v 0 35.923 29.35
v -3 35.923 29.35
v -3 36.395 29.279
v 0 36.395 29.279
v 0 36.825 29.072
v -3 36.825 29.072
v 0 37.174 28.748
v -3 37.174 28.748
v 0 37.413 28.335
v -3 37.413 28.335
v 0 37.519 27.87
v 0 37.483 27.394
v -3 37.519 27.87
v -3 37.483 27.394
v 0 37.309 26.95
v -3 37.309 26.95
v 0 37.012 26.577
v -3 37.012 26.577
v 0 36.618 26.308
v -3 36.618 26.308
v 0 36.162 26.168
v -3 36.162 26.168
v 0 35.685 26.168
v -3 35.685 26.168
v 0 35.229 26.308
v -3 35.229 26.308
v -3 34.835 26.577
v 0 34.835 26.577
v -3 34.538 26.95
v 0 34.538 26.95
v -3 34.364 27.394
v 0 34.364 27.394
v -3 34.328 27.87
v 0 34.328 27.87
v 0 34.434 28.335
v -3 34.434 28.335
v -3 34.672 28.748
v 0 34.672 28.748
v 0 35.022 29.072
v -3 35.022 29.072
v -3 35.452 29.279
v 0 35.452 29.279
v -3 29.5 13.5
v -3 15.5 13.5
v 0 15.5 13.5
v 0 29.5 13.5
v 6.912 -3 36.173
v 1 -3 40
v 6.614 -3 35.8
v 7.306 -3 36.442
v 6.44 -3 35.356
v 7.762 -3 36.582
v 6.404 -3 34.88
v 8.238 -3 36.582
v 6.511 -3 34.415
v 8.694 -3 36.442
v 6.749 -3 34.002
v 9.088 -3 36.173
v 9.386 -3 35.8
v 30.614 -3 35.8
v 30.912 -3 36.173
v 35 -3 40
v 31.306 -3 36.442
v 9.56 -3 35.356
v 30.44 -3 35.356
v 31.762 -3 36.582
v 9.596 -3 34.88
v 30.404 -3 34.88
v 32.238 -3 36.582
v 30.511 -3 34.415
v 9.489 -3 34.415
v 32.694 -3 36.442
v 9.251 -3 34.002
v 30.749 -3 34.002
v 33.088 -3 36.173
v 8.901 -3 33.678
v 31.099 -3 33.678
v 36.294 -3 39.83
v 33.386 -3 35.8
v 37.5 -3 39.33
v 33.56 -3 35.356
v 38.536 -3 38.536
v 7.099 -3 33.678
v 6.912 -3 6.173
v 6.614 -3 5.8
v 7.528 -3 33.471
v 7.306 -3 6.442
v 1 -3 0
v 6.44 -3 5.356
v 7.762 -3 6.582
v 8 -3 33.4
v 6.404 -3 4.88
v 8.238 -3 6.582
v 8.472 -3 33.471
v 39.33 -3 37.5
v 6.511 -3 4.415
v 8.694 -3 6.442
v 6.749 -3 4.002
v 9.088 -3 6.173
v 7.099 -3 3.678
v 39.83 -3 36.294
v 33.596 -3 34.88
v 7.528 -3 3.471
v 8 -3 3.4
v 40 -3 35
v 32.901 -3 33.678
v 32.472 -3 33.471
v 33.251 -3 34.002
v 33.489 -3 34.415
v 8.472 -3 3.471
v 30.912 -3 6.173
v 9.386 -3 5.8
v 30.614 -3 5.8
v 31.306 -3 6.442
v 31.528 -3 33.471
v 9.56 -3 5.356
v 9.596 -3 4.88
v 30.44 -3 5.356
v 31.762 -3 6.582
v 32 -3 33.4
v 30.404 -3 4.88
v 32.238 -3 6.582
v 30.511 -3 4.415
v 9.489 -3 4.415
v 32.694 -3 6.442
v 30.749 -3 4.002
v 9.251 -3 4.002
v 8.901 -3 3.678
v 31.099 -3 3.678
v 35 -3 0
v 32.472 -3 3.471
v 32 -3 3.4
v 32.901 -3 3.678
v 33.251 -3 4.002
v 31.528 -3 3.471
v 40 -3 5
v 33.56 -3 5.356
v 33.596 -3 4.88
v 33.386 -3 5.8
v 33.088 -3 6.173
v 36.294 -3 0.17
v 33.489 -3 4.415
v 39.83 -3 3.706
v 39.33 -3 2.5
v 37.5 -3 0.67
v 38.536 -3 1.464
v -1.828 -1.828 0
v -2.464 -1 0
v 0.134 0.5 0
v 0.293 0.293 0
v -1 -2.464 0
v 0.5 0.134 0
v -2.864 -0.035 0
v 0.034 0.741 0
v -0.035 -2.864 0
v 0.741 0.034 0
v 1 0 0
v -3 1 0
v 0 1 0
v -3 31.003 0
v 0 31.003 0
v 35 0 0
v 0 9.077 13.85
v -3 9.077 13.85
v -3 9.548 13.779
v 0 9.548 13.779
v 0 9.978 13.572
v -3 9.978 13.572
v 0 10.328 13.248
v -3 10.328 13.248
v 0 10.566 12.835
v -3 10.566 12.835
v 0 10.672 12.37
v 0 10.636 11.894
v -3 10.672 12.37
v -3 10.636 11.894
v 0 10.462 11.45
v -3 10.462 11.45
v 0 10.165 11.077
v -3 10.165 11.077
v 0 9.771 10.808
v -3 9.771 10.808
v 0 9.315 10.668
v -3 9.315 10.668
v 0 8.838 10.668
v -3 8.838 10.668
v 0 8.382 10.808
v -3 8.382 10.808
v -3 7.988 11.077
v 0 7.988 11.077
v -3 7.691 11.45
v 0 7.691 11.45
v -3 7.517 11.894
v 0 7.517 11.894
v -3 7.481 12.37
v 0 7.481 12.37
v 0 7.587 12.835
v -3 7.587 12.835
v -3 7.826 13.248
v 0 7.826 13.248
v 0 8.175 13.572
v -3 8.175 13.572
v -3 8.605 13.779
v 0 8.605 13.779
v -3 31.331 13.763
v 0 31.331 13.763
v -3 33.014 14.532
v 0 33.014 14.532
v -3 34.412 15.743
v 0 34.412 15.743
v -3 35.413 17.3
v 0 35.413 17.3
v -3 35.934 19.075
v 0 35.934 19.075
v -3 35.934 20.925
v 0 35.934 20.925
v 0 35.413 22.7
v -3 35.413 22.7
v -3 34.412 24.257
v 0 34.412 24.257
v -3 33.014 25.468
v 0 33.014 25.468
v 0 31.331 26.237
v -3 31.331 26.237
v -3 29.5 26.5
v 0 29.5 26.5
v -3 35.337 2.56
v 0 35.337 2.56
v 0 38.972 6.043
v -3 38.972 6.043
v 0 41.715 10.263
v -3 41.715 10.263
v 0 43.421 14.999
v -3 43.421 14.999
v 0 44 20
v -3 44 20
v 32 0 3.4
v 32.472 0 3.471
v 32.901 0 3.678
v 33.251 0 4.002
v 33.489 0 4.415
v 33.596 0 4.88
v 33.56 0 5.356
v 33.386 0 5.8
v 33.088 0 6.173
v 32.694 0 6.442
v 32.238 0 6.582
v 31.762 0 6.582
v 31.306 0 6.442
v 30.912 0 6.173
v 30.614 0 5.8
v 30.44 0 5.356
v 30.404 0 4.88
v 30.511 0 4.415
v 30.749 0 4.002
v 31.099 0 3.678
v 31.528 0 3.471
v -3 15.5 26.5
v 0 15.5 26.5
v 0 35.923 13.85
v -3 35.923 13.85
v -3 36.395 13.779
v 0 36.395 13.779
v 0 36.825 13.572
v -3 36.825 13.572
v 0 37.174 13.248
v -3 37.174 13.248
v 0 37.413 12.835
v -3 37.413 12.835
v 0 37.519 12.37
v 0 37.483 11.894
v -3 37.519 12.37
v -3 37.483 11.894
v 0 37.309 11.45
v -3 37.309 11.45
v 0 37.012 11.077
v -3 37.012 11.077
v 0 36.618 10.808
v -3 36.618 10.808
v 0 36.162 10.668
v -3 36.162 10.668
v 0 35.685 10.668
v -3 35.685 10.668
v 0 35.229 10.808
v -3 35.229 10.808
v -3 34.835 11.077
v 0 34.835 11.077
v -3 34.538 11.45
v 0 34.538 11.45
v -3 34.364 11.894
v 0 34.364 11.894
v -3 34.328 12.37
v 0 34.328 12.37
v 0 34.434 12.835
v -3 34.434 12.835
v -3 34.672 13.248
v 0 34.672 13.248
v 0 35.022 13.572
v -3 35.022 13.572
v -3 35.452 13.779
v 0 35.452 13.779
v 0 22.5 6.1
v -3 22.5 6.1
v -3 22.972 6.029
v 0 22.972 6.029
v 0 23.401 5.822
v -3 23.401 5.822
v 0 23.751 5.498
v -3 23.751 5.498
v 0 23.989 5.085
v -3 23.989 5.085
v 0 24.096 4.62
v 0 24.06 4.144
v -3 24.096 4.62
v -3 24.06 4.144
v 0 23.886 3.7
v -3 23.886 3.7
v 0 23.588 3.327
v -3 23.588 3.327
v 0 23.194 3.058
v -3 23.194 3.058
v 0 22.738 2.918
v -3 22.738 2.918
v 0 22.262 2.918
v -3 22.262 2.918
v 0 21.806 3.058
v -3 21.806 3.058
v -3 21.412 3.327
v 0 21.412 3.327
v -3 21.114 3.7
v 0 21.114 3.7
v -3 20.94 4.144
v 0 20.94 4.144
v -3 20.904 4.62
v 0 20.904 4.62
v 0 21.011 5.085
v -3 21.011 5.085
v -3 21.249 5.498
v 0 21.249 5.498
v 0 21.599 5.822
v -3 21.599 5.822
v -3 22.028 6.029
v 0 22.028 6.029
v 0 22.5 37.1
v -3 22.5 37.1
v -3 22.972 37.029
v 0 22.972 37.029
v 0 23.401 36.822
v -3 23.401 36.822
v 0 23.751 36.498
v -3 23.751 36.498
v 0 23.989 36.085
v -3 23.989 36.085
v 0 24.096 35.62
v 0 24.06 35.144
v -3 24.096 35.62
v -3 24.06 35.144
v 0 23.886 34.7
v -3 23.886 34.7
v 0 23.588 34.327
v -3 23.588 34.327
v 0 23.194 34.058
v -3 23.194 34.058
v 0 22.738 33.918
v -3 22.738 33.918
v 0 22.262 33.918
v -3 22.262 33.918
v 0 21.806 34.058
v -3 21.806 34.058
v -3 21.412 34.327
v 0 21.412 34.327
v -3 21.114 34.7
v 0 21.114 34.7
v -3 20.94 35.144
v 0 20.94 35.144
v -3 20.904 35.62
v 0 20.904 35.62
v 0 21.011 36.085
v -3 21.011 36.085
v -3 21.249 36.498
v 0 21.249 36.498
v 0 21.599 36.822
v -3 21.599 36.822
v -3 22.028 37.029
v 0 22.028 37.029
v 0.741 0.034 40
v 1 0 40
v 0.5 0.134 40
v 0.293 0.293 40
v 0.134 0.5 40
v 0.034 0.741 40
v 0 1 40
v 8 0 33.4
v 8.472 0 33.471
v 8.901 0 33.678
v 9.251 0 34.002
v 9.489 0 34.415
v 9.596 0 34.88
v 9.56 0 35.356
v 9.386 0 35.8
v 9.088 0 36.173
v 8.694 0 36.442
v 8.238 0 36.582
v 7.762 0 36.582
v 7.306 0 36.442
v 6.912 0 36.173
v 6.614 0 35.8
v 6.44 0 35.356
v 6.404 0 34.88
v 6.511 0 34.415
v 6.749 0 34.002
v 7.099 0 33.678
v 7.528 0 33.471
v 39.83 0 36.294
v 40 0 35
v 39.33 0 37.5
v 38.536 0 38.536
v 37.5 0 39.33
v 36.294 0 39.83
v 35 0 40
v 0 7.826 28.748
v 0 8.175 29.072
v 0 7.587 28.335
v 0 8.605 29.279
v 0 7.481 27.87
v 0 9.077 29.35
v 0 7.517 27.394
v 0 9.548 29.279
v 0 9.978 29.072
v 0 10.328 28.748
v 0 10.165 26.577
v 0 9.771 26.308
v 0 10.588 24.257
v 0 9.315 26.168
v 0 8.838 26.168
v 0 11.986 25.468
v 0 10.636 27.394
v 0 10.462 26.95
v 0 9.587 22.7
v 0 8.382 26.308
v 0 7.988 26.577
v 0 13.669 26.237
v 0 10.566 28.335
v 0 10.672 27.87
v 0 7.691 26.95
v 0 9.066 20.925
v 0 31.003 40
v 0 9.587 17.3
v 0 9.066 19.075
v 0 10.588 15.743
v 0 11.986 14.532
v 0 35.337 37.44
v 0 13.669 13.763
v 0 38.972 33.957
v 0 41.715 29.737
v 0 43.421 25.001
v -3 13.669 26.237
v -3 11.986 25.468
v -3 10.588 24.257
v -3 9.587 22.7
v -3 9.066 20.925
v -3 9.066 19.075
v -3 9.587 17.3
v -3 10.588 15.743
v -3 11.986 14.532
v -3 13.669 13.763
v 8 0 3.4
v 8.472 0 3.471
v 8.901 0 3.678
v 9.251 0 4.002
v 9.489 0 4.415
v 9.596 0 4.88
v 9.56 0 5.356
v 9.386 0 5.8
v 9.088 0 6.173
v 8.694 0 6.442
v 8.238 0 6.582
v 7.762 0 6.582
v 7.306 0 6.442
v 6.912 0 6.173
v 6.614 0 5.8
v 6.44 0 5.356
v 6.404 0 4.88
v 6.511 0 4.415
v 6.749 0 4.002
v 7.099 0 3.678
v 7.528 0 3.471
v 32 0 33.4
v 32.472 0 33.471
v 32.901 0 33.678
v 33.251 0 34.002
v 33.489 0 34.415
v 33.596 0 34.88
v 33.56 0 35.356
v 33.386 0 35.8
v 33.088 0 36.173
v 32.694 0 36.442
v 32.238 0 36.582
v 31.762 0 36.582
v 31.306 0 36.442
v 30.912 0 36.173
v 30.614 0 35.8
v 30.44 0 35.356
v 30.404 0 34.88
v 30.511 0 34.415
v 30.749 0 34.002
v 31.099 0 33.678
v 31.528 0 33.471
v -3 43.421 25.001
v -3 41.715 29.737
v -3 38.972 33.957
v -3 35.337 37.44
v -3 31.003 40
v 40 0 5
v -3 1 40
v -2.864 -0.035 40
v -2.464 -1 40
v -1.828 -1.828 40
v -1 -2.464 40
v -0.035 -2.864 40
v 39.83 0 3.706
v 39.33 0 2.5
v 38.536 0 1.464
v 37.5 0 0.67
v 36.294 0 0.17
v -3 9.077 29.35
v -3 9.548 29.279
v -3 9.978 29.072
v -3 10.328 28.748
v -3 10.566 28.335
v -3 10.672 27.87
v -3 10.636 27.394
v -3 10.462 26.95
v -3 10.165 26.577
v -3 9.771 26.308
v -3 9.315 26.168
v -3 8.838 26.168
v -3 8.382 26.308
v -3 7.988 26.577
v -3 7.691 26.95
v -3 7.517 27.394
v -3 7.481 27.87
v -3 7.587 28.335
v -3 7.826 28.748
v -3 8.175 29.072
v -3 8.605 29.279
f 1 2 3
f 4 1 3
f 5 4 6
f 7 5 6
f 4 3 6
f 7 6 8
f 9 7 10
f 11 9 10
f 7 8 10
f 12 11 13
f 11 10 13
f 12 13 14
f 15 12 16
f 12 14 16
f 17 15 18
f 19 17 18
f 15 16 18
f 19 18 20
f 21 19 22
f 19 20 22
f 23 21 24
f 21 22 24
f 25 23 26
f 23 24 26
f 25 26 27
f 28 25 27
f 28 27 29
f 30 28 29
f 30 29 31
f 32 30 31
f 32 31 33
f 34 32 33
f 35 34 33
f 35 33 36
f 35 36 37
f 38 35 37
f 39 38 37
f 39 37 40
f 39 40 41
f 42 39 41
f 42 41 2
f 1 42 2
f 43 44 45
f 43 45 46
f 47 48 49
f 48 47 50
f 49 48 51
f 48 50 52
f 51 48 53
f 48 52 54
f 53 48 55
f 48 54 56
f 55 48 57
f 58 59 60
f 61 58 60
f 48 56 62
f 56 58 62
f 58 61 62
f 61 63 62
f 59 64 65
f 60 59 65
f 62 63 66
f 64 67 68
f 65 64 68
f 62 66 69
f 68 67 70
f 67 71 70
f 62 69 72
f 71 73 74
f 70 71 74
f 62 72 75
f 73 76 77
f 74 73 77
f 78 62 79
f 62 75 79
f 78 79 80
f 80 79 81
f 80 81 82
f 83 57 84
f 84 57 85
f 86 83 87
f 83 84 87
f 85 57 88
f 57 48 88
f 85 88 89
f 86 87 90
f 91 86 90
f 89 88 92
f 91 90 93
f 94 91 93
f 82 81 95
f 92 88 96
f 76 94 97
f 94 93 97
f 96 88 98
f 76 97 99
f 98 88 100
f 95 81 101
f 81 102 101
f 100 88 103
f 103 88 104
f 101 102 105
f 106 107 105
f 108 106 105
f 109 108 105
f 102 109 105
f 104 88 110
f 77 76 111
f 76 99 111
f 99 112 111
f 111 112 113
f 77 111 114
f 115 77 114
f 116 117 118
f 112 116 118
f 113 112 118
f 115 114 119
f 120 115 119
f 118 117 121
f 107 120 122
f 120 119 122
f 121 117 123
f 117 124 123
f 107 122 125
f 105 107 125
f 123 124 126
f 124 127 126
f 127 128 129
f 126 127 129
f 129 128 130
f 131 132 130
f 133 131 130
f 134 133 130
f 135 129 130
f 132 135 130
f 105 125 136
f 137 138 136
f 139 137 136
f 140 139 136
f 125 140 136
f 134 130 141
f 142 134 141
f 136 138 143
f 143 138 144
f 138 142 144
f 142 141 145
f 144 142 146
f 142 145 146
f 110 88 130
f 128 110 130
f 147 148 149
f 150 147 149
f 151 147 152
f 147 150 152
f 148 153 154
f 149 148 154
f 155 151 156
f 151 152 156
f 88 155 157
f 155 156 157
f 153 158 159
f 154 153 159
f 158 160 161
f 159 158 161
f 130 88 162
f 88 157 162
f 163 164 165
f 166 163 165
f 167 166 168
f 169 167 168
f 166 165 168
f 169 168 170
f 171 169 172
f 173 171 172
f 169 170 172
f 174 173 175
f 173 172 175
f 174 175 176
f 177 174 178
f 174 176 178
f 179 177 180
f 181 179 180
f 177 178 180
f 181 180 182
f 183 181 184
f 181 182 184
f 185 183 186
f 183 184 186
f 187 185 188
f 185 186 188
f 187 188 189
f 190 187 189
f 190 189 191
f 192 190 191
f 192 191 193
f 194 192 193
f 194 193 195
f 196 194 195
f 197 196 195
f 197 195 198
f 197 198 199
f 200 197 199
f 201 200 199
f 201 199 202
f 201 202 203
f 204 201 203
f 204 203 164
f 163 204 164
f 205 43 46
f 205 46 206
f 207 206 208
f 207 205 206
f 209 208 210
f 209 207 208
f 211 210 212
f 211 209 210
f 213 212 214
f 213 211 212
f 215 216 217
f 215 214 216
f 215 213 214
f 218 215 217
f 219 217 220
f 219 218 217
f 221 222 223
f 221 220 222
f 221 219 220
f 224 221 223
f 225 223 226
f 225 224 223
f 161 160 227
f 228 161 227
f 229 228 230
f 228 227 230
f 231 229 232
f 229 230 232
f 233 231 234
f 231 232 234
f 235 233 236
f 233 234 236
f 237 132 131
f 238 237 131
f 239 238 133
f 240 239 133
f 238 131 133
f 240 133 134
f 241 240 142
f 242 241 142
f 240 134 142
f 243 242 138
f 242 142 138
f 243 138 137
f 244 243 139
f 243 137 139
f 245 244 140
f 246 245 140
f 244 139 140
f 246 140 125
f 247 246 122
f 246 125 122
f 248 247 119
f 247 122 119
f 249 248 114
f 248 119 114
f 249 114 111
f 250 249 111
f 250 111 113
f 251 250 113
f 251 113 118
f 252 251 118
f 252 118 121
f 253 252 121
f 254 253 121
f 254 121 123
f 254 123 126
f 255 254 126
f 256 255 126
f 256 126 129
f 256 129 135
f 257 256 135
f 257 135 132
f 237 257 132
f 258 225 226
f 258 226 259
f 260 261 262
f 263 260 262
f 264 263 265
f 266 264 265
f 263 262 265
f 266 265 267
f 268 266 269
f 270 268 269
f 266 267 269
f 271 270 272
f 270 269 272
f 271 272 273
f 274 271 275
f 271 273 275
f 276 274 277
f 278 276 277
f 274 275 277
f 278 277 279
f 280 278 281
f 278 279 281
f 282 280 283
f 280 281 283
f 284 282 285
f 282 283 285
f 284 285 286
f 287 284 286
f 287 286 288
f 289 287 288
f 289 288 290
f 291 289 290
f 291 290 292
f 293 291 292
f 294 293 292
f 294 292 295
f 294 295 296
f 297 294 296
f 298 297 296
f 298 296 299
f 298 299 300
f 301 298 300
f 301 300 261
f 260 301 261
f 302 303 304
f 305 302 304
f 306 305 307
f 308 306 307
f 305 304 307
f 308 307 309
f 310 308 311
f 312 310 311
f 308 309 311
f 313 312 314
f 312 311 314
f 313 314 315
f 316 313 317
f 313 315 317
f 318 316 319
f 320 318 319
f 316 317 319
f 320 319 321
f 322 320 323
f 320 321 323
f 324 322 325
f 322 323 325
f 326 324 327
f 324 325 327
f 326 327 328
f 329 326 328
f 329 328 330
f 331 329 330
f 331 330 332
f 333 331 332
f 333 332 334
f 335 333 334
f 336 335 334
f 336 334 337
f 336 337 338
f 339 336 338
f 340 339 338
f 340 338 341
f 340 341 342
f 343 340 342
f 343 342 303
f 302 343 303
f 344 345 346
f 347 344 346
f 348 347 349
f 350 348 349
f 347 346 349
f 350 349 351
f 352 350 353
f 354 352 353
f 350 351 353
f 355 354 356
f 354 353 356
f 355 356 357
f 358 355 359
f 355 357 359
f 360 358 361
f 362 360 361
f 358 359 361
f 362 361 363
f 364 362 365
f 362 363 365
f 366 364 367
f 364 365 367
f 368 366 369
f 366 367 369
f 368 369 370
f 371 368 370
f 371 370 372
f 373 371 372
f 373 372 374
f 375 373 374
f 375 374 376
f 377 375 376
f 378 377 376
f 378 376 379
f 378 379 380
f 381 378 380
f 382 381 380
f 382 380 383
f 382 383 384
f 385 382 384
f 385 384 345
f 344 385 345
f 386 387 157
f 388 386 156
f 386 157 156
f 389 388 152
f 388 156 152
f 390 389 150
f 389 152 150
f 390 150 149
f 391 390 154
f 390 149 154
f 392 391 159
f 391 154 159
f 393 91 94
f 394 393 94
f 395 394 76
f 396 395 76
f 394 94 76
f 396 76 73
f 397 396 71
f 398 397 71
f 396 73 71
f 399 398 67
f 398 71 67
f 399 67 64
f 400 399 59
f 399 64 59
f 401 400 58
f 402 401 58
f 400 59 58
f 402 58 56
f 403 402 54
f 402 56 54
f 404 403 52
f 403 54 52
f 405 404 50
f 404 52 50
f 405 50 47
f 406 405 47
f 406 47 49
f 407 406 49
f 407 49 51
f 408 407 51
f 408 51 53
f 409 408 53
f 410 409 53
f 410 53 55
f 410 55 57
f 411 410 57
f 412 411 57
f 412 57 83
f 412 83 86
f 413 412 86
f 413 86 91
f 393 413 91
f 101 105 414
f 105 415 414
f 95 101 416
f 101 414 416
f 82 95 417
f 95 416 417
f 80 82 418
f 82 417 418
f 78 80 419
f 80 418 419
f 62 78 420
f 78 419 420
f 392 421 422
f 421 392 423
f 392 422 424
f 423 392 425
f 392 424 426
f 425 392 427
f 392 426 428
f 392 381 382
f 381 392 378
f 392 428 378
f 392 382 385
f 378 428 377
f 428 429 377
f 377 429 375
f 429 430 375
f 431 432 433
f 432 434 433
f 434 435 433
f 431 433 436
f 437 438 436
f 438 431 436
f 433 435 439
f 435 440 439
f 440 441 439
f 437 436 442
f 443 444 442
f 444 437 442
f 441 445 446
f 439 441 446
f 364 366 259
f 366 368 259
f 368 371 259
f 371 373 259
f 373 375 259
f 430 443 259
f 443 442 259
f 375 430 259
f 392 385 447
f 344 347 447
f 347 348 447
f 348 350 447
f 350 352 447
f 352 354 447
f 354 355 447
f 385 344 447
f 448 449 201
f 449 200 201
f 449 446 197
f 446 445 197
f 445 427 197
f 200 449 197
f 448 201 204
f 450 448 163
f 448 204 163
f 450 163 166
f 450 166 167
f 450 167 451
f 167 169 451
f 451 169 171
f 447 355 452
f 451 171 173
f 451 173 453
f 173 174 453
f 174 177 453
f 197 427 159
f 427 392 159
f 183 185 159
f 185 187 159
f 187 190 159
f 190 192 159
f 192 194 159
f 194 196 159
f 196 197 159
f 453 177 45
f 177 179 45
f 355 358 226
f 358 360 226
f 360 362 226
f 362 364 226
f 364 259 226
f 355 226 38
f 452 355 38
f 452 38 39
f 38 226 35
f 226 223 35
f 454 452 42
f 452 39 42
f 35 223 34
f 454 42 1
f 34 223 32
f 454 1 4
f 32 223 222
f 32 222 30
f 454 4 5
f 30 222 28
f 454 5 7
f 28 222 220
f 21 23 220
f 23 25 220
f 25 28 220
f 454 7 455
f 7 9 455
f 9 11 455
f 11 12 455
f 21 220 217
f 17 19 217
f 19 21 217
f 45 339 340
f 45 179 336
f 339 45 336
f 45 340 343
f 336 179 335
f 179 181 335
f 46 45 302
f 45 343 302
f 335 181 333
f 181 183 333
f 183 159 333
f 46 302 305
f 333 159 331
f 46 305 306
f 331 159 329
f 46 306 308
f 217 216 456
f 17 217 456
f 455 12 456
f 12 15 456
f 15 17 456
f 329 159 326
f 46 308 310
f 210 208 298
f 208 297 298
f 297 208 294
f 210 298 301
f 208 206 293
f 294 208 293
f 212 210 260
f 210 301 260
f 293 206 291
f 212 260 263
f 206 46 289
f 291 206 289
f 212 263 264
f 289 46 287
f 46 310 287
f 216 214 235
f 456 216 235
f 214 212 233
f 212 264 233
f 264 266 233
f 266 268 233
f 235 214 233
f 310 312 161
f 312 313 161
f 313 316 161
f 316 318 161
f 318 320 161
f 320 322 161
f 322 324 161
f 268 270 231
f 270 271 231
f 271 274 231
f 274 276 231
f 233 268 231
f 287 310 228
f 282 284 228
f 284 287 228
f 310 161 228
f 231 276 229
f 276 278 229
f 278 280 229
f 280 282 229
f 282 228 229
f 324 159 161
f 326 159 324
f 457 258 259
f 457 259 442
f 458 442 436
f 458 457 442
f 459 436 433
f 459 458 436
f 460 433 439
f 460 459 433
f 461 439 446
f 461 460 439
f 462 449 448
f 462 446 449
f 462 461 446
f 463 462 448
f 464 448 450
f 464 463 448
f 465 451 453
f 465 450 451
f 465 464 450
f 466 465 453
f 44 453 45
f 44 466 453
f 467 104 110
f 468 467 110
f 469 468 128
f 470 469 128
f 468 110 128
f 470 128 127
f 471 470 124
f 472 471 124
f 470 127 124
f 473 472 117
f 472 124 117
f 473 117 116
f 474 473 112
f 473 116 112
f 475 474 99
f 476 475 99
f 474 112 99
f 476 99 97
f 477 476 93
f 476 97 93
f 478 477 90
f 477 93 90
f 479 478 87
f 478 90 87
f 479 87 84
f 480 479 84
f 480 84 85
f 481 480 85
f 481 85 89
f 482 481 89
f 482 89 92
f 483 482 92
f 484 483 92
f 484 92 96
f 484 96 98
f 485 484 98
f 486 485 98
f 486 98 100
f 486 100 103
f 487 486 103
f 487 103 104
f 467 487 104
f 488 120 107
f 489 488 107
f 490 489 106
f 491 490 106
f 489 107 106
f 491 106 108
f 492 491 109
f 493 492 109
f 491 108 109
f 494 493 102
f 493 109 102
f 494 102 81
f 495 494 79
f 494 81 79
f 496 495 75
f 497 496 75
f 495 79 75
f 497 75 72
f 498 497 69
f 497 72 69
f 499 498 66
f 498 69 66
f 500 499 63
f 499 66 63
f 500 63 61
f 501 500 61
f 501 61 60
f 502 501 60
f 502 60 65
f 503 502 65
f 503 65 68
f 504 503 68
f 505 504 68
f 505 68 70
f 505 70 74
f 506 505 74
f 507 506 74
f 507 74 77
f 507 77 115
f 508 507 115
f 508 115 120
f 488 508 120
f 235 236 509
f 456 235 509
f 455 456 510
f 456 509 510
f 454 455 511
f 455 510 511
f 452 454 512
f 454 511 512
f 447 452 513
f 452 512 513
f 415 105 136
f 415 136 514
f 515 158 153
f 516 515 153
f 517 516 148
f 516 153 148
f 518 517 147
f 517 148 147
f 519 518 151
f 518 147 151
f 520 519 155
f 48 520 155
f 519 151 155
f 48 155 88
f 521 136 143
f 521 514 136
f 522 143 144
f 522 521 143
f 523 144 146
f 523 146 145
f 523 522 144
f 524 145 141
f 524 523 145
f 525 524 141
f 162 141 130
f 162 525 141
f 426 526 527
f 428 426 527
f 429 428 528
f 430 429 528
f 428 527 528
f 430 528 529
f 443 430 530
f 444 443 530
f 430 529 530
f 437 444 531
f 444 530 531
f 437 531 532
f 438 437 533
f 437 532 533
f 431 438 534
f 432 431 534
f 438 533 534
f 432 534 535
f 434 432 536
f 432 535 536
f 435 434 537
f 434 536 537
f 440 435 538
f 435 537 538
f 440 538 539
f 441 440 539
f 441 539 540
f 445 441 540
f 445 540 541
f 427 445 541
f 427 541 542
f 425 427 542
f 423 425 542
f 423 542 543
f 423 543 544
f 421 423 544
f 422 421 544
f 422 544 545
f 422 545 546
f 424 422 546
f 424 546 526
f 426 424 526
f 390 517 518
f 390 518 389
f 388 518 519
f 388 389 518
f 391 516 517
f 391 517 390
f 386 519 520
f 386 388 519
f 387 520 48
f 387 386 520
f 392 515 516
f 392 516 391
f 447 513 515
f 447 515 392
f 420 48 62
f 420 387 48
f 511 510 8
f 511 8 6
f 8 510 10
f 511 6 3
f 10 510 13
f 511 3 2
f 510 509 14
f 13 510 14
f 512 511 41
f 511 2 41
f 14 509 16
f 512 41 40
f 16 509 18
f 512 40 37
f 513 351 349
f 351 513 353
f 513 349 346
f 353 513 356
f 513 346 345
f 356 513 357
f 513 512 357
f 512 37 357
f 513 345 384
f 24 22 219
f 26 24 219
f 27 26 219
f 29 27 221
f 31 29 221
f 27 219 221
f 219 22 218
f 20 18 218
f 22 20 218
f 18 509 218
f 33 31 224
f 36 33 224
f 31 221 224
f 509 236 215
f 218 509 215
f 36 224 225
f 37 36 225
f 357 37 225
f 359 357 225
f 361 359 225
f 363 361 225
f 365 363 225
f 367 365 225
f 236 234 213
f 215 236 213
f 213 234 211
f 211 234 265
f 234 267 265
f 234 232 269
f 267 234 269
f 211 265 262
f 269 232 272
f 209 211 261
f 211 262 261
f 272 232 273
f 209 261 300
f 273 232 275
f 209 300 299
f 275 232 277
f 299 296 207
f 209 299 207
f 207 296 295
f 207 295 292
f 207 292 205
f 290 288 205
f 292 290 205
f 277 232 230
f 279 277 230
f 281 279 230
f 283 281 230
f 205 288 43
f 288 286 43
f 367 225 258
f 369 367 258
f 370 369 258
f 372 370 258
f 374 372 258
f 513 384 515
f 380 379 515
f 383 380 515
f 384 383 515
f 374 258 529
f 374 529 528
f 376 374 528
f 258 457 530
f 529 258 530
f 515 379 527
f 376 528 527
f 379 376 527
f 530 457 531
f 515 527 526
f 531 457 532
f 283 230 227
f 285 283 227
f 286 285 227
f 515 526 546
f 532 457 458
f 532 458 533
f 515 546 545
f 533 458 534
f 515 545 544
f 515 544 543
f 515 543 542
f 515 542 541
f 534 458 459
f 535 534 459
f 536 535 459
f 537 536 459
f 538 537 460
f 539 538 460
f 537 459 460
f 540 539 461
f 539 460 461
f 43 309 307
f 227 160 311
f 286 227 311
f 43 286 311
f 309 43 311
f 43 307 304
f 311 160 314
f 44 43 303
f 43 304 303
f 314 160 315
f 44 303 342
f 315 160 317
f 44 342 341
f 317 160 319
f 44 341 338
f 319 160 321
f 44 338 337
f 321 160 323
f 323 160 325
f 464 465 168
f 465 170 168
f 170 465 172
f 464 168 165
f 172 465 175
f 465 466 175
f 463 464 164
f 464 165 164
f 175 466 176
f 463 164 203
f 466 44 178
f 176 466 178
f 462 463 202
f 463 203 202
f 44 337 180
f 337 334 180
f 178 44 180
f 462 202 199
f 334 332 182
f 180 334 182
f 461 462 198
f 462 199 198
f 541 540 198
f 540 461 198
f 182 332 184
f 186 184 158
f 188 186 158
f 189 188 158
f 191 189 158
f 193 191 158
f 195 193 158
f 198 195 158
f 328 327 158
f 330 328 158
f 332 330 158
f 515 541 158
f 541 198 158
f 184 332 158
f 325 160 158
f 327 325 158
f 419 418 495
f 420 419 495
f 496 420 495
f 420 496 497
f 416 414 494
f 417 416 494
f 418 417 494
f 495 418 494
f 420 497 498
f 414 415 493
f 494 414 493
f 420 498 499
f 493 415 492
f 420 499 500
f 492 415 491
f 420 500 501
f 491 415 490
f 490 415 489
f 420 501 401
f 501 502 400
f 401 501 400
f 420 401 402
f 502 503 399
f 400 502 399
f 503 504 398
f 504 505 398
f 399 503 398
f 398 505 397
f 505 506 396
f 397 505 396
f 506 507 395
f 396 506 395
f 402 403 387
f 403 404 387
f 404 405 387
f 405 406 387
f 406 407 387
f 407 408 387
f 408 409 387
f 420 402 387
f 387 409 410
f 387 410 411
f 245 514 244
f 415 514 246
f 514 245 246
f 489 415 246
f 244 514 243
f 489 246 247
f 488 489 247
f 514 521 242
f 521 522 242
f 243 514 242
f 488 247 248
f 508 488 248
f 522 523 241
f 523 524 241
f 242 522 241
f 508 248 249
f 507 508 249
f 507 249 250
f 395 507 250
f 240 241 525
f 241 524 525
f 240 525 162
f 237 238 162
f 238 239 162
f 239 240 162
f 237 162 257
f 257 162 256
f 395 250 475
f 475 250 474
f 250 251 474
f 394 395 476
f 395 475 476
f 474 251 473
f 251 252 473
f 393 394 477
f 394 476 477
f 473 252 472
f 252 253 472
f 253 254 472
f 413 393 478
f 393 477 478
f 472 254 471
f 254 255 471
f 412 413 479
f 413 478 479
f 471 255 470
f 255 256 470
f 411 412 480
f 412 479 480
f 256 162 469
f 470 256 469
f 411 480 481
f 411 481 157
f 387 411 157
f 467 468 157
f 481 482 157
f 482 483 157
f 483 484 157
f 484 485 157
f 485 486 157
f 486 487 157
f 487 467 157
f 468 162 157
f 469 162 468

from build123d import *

# Parameters (mm, degrees)
SM_BASE_FLANGE_1_DEPTH      = 40
CUT_EXTRUDE_3_DEPTH         = 10
CUT_EXTRUDE_1_DEPTH         = 74.382559236
SKETCH_7_R                  = 1.6
CUT_EXTRUDE_2_DEPTH         = 74.382559236
SKETCH_9_R                  = 1.6
CUT_EXTRUDE_4_DEPTH         = 74.545904033
PATTERN_LINEAR_1_COUNT      = 2
PATTERN_LINEAR_1_PITCH      = 30
PATTERN_LINEAR_1_COUNT_DIR2 = 2
PATTERN_LINEAR_1_PITCH_DIR2 = 24
FILLET_1_R                  = 5


# Sheet-metal steps are written as plain solids
with BuildPart() as part:
    # Sketch 1 → 基材-凸緣1 (new body)
    with BuildSketch(Plane.XY):
        with BuildLine():
            Line((40, 0), (1, 0))
            ThreePointArc((1, 0), (0.292893219, 0.292893219), (0, 1))
            Line((0, 1), (0, 44))
            Line((0, 44), (-3, 44))
            Line((-3, 44), (-3, 1))
            ThreePointArc((-3, 1), (-1.828427125, -1.828427125), (1, -3))
            Line((1, -3), (40, -3))
            Line((40, -3), (40, 0))
        make_face()
    extrude(amount=SM_BASE_FLANGE_1_DEPTH)

    # 草圖8 → 除料-伸長3 (cut)
    with BuildSketch(Plane.ZY.offset(3)):
        with BuildLine():
            Line((0, 44), (0, 31.002788981))
            ThreePointArc((0, 31.002788981), (8.073899482, 40.465261916), (20, 44))
            Line((20, 44), (0, 44))
        make_face()
        with BuildLine():
            ThreePointArc((20, 44), (31.926100518, 40.465261916), (40, 31.002788981))
            Line((40, 31.002788981), (40, 44))
            Line((40, 44), (20, 44))
        make_face()
    extrude(amount=-CUT_EXTRUDE_3_DEPTH, mode=Mode.SUBTRACT)

    # 草圖6 → 除料-伸長1 (cut, through all)
    with BuildSketch(Plane.ZY.offset(3)):
        with BuildLine():
            Line((26.5, 29.5), (26.5, 15.5))
            ThreePointArc((26.5, 15.5), (20, 9), (13.5, 15.5))
            Line((13.5, 15.5), (13.5, 29.5))
            ThreePointArc((13.5, 29.5), (20, 36), (26.5, 29.5))
        make_face()
    extrude(amount=-CUT_EXTRUDE_1_DEPTH, mode=Mode.SUBTRACT)

    # 草圖7 → 除料-伸長2 (cut, through all)
    with BuildSketch(Plane.ZY.offset(3)):
        with Locations((4.5, 22.5)):
            Circle(SKETCH_7_R)
        with Locations((12.25, 9.076606241)):
            Circle(SKETCH_7_R)
        with Locations((27.75, 9.076606241)):
            Circle(SKETCH_7_R)
        with Locations((35.5, 22.5)):
            Circle(SKETCH_7_R)
        with Locations((27.75, 35.923393759)):
            Circle(SKETCH_7_R)
        with Locations((12.25, 35.923393759)):
            Circle(SKETCH_7_R)
    extrude(amount=-CUT_EXTRUDE_2_DEPTH, mode=Mode.SUBTRACT)

    # 草圖9 → 除料-伸長4 (cut, through all)
    with BuildSketch(Plane.XZ.offset(3)):
        with Locations(Location((32, 35, 0), (0, 0, 270))):
            Circle(SKETCH_9_R)
    cut_extrude_4 = extrude(amount=-CUT_EXTRUDE_4_DEPTH, mode=Mode.SUBTRACT)

    # 直線複製排列1: Cut-Extrude 4 2 × 2
    with Locations(*[(-j * PATTERN_LINEAR_1_PITCH_DIR2, 0, -i * PATTERN_LINEAR_1_PITCH) for i in range(PATTERN_LINEAR_1_COUNT) for j in range(PATTERN_LINEAR_1_COUNT_DIR2) if (i, j) != (0, 0)]):
        add(cut_extrude_4, mode=Mode.SUBTRACT)

    # 圓角1
    fillet_1_edges = [part.edges().sort_by_distance(p)[0] for p in [
        (40, -1.5, 40),
        (40, -1.5, 0),
    ]]
    fillet(fillet_1_edges, radius=FILLET_1_R)


solid = part.part
